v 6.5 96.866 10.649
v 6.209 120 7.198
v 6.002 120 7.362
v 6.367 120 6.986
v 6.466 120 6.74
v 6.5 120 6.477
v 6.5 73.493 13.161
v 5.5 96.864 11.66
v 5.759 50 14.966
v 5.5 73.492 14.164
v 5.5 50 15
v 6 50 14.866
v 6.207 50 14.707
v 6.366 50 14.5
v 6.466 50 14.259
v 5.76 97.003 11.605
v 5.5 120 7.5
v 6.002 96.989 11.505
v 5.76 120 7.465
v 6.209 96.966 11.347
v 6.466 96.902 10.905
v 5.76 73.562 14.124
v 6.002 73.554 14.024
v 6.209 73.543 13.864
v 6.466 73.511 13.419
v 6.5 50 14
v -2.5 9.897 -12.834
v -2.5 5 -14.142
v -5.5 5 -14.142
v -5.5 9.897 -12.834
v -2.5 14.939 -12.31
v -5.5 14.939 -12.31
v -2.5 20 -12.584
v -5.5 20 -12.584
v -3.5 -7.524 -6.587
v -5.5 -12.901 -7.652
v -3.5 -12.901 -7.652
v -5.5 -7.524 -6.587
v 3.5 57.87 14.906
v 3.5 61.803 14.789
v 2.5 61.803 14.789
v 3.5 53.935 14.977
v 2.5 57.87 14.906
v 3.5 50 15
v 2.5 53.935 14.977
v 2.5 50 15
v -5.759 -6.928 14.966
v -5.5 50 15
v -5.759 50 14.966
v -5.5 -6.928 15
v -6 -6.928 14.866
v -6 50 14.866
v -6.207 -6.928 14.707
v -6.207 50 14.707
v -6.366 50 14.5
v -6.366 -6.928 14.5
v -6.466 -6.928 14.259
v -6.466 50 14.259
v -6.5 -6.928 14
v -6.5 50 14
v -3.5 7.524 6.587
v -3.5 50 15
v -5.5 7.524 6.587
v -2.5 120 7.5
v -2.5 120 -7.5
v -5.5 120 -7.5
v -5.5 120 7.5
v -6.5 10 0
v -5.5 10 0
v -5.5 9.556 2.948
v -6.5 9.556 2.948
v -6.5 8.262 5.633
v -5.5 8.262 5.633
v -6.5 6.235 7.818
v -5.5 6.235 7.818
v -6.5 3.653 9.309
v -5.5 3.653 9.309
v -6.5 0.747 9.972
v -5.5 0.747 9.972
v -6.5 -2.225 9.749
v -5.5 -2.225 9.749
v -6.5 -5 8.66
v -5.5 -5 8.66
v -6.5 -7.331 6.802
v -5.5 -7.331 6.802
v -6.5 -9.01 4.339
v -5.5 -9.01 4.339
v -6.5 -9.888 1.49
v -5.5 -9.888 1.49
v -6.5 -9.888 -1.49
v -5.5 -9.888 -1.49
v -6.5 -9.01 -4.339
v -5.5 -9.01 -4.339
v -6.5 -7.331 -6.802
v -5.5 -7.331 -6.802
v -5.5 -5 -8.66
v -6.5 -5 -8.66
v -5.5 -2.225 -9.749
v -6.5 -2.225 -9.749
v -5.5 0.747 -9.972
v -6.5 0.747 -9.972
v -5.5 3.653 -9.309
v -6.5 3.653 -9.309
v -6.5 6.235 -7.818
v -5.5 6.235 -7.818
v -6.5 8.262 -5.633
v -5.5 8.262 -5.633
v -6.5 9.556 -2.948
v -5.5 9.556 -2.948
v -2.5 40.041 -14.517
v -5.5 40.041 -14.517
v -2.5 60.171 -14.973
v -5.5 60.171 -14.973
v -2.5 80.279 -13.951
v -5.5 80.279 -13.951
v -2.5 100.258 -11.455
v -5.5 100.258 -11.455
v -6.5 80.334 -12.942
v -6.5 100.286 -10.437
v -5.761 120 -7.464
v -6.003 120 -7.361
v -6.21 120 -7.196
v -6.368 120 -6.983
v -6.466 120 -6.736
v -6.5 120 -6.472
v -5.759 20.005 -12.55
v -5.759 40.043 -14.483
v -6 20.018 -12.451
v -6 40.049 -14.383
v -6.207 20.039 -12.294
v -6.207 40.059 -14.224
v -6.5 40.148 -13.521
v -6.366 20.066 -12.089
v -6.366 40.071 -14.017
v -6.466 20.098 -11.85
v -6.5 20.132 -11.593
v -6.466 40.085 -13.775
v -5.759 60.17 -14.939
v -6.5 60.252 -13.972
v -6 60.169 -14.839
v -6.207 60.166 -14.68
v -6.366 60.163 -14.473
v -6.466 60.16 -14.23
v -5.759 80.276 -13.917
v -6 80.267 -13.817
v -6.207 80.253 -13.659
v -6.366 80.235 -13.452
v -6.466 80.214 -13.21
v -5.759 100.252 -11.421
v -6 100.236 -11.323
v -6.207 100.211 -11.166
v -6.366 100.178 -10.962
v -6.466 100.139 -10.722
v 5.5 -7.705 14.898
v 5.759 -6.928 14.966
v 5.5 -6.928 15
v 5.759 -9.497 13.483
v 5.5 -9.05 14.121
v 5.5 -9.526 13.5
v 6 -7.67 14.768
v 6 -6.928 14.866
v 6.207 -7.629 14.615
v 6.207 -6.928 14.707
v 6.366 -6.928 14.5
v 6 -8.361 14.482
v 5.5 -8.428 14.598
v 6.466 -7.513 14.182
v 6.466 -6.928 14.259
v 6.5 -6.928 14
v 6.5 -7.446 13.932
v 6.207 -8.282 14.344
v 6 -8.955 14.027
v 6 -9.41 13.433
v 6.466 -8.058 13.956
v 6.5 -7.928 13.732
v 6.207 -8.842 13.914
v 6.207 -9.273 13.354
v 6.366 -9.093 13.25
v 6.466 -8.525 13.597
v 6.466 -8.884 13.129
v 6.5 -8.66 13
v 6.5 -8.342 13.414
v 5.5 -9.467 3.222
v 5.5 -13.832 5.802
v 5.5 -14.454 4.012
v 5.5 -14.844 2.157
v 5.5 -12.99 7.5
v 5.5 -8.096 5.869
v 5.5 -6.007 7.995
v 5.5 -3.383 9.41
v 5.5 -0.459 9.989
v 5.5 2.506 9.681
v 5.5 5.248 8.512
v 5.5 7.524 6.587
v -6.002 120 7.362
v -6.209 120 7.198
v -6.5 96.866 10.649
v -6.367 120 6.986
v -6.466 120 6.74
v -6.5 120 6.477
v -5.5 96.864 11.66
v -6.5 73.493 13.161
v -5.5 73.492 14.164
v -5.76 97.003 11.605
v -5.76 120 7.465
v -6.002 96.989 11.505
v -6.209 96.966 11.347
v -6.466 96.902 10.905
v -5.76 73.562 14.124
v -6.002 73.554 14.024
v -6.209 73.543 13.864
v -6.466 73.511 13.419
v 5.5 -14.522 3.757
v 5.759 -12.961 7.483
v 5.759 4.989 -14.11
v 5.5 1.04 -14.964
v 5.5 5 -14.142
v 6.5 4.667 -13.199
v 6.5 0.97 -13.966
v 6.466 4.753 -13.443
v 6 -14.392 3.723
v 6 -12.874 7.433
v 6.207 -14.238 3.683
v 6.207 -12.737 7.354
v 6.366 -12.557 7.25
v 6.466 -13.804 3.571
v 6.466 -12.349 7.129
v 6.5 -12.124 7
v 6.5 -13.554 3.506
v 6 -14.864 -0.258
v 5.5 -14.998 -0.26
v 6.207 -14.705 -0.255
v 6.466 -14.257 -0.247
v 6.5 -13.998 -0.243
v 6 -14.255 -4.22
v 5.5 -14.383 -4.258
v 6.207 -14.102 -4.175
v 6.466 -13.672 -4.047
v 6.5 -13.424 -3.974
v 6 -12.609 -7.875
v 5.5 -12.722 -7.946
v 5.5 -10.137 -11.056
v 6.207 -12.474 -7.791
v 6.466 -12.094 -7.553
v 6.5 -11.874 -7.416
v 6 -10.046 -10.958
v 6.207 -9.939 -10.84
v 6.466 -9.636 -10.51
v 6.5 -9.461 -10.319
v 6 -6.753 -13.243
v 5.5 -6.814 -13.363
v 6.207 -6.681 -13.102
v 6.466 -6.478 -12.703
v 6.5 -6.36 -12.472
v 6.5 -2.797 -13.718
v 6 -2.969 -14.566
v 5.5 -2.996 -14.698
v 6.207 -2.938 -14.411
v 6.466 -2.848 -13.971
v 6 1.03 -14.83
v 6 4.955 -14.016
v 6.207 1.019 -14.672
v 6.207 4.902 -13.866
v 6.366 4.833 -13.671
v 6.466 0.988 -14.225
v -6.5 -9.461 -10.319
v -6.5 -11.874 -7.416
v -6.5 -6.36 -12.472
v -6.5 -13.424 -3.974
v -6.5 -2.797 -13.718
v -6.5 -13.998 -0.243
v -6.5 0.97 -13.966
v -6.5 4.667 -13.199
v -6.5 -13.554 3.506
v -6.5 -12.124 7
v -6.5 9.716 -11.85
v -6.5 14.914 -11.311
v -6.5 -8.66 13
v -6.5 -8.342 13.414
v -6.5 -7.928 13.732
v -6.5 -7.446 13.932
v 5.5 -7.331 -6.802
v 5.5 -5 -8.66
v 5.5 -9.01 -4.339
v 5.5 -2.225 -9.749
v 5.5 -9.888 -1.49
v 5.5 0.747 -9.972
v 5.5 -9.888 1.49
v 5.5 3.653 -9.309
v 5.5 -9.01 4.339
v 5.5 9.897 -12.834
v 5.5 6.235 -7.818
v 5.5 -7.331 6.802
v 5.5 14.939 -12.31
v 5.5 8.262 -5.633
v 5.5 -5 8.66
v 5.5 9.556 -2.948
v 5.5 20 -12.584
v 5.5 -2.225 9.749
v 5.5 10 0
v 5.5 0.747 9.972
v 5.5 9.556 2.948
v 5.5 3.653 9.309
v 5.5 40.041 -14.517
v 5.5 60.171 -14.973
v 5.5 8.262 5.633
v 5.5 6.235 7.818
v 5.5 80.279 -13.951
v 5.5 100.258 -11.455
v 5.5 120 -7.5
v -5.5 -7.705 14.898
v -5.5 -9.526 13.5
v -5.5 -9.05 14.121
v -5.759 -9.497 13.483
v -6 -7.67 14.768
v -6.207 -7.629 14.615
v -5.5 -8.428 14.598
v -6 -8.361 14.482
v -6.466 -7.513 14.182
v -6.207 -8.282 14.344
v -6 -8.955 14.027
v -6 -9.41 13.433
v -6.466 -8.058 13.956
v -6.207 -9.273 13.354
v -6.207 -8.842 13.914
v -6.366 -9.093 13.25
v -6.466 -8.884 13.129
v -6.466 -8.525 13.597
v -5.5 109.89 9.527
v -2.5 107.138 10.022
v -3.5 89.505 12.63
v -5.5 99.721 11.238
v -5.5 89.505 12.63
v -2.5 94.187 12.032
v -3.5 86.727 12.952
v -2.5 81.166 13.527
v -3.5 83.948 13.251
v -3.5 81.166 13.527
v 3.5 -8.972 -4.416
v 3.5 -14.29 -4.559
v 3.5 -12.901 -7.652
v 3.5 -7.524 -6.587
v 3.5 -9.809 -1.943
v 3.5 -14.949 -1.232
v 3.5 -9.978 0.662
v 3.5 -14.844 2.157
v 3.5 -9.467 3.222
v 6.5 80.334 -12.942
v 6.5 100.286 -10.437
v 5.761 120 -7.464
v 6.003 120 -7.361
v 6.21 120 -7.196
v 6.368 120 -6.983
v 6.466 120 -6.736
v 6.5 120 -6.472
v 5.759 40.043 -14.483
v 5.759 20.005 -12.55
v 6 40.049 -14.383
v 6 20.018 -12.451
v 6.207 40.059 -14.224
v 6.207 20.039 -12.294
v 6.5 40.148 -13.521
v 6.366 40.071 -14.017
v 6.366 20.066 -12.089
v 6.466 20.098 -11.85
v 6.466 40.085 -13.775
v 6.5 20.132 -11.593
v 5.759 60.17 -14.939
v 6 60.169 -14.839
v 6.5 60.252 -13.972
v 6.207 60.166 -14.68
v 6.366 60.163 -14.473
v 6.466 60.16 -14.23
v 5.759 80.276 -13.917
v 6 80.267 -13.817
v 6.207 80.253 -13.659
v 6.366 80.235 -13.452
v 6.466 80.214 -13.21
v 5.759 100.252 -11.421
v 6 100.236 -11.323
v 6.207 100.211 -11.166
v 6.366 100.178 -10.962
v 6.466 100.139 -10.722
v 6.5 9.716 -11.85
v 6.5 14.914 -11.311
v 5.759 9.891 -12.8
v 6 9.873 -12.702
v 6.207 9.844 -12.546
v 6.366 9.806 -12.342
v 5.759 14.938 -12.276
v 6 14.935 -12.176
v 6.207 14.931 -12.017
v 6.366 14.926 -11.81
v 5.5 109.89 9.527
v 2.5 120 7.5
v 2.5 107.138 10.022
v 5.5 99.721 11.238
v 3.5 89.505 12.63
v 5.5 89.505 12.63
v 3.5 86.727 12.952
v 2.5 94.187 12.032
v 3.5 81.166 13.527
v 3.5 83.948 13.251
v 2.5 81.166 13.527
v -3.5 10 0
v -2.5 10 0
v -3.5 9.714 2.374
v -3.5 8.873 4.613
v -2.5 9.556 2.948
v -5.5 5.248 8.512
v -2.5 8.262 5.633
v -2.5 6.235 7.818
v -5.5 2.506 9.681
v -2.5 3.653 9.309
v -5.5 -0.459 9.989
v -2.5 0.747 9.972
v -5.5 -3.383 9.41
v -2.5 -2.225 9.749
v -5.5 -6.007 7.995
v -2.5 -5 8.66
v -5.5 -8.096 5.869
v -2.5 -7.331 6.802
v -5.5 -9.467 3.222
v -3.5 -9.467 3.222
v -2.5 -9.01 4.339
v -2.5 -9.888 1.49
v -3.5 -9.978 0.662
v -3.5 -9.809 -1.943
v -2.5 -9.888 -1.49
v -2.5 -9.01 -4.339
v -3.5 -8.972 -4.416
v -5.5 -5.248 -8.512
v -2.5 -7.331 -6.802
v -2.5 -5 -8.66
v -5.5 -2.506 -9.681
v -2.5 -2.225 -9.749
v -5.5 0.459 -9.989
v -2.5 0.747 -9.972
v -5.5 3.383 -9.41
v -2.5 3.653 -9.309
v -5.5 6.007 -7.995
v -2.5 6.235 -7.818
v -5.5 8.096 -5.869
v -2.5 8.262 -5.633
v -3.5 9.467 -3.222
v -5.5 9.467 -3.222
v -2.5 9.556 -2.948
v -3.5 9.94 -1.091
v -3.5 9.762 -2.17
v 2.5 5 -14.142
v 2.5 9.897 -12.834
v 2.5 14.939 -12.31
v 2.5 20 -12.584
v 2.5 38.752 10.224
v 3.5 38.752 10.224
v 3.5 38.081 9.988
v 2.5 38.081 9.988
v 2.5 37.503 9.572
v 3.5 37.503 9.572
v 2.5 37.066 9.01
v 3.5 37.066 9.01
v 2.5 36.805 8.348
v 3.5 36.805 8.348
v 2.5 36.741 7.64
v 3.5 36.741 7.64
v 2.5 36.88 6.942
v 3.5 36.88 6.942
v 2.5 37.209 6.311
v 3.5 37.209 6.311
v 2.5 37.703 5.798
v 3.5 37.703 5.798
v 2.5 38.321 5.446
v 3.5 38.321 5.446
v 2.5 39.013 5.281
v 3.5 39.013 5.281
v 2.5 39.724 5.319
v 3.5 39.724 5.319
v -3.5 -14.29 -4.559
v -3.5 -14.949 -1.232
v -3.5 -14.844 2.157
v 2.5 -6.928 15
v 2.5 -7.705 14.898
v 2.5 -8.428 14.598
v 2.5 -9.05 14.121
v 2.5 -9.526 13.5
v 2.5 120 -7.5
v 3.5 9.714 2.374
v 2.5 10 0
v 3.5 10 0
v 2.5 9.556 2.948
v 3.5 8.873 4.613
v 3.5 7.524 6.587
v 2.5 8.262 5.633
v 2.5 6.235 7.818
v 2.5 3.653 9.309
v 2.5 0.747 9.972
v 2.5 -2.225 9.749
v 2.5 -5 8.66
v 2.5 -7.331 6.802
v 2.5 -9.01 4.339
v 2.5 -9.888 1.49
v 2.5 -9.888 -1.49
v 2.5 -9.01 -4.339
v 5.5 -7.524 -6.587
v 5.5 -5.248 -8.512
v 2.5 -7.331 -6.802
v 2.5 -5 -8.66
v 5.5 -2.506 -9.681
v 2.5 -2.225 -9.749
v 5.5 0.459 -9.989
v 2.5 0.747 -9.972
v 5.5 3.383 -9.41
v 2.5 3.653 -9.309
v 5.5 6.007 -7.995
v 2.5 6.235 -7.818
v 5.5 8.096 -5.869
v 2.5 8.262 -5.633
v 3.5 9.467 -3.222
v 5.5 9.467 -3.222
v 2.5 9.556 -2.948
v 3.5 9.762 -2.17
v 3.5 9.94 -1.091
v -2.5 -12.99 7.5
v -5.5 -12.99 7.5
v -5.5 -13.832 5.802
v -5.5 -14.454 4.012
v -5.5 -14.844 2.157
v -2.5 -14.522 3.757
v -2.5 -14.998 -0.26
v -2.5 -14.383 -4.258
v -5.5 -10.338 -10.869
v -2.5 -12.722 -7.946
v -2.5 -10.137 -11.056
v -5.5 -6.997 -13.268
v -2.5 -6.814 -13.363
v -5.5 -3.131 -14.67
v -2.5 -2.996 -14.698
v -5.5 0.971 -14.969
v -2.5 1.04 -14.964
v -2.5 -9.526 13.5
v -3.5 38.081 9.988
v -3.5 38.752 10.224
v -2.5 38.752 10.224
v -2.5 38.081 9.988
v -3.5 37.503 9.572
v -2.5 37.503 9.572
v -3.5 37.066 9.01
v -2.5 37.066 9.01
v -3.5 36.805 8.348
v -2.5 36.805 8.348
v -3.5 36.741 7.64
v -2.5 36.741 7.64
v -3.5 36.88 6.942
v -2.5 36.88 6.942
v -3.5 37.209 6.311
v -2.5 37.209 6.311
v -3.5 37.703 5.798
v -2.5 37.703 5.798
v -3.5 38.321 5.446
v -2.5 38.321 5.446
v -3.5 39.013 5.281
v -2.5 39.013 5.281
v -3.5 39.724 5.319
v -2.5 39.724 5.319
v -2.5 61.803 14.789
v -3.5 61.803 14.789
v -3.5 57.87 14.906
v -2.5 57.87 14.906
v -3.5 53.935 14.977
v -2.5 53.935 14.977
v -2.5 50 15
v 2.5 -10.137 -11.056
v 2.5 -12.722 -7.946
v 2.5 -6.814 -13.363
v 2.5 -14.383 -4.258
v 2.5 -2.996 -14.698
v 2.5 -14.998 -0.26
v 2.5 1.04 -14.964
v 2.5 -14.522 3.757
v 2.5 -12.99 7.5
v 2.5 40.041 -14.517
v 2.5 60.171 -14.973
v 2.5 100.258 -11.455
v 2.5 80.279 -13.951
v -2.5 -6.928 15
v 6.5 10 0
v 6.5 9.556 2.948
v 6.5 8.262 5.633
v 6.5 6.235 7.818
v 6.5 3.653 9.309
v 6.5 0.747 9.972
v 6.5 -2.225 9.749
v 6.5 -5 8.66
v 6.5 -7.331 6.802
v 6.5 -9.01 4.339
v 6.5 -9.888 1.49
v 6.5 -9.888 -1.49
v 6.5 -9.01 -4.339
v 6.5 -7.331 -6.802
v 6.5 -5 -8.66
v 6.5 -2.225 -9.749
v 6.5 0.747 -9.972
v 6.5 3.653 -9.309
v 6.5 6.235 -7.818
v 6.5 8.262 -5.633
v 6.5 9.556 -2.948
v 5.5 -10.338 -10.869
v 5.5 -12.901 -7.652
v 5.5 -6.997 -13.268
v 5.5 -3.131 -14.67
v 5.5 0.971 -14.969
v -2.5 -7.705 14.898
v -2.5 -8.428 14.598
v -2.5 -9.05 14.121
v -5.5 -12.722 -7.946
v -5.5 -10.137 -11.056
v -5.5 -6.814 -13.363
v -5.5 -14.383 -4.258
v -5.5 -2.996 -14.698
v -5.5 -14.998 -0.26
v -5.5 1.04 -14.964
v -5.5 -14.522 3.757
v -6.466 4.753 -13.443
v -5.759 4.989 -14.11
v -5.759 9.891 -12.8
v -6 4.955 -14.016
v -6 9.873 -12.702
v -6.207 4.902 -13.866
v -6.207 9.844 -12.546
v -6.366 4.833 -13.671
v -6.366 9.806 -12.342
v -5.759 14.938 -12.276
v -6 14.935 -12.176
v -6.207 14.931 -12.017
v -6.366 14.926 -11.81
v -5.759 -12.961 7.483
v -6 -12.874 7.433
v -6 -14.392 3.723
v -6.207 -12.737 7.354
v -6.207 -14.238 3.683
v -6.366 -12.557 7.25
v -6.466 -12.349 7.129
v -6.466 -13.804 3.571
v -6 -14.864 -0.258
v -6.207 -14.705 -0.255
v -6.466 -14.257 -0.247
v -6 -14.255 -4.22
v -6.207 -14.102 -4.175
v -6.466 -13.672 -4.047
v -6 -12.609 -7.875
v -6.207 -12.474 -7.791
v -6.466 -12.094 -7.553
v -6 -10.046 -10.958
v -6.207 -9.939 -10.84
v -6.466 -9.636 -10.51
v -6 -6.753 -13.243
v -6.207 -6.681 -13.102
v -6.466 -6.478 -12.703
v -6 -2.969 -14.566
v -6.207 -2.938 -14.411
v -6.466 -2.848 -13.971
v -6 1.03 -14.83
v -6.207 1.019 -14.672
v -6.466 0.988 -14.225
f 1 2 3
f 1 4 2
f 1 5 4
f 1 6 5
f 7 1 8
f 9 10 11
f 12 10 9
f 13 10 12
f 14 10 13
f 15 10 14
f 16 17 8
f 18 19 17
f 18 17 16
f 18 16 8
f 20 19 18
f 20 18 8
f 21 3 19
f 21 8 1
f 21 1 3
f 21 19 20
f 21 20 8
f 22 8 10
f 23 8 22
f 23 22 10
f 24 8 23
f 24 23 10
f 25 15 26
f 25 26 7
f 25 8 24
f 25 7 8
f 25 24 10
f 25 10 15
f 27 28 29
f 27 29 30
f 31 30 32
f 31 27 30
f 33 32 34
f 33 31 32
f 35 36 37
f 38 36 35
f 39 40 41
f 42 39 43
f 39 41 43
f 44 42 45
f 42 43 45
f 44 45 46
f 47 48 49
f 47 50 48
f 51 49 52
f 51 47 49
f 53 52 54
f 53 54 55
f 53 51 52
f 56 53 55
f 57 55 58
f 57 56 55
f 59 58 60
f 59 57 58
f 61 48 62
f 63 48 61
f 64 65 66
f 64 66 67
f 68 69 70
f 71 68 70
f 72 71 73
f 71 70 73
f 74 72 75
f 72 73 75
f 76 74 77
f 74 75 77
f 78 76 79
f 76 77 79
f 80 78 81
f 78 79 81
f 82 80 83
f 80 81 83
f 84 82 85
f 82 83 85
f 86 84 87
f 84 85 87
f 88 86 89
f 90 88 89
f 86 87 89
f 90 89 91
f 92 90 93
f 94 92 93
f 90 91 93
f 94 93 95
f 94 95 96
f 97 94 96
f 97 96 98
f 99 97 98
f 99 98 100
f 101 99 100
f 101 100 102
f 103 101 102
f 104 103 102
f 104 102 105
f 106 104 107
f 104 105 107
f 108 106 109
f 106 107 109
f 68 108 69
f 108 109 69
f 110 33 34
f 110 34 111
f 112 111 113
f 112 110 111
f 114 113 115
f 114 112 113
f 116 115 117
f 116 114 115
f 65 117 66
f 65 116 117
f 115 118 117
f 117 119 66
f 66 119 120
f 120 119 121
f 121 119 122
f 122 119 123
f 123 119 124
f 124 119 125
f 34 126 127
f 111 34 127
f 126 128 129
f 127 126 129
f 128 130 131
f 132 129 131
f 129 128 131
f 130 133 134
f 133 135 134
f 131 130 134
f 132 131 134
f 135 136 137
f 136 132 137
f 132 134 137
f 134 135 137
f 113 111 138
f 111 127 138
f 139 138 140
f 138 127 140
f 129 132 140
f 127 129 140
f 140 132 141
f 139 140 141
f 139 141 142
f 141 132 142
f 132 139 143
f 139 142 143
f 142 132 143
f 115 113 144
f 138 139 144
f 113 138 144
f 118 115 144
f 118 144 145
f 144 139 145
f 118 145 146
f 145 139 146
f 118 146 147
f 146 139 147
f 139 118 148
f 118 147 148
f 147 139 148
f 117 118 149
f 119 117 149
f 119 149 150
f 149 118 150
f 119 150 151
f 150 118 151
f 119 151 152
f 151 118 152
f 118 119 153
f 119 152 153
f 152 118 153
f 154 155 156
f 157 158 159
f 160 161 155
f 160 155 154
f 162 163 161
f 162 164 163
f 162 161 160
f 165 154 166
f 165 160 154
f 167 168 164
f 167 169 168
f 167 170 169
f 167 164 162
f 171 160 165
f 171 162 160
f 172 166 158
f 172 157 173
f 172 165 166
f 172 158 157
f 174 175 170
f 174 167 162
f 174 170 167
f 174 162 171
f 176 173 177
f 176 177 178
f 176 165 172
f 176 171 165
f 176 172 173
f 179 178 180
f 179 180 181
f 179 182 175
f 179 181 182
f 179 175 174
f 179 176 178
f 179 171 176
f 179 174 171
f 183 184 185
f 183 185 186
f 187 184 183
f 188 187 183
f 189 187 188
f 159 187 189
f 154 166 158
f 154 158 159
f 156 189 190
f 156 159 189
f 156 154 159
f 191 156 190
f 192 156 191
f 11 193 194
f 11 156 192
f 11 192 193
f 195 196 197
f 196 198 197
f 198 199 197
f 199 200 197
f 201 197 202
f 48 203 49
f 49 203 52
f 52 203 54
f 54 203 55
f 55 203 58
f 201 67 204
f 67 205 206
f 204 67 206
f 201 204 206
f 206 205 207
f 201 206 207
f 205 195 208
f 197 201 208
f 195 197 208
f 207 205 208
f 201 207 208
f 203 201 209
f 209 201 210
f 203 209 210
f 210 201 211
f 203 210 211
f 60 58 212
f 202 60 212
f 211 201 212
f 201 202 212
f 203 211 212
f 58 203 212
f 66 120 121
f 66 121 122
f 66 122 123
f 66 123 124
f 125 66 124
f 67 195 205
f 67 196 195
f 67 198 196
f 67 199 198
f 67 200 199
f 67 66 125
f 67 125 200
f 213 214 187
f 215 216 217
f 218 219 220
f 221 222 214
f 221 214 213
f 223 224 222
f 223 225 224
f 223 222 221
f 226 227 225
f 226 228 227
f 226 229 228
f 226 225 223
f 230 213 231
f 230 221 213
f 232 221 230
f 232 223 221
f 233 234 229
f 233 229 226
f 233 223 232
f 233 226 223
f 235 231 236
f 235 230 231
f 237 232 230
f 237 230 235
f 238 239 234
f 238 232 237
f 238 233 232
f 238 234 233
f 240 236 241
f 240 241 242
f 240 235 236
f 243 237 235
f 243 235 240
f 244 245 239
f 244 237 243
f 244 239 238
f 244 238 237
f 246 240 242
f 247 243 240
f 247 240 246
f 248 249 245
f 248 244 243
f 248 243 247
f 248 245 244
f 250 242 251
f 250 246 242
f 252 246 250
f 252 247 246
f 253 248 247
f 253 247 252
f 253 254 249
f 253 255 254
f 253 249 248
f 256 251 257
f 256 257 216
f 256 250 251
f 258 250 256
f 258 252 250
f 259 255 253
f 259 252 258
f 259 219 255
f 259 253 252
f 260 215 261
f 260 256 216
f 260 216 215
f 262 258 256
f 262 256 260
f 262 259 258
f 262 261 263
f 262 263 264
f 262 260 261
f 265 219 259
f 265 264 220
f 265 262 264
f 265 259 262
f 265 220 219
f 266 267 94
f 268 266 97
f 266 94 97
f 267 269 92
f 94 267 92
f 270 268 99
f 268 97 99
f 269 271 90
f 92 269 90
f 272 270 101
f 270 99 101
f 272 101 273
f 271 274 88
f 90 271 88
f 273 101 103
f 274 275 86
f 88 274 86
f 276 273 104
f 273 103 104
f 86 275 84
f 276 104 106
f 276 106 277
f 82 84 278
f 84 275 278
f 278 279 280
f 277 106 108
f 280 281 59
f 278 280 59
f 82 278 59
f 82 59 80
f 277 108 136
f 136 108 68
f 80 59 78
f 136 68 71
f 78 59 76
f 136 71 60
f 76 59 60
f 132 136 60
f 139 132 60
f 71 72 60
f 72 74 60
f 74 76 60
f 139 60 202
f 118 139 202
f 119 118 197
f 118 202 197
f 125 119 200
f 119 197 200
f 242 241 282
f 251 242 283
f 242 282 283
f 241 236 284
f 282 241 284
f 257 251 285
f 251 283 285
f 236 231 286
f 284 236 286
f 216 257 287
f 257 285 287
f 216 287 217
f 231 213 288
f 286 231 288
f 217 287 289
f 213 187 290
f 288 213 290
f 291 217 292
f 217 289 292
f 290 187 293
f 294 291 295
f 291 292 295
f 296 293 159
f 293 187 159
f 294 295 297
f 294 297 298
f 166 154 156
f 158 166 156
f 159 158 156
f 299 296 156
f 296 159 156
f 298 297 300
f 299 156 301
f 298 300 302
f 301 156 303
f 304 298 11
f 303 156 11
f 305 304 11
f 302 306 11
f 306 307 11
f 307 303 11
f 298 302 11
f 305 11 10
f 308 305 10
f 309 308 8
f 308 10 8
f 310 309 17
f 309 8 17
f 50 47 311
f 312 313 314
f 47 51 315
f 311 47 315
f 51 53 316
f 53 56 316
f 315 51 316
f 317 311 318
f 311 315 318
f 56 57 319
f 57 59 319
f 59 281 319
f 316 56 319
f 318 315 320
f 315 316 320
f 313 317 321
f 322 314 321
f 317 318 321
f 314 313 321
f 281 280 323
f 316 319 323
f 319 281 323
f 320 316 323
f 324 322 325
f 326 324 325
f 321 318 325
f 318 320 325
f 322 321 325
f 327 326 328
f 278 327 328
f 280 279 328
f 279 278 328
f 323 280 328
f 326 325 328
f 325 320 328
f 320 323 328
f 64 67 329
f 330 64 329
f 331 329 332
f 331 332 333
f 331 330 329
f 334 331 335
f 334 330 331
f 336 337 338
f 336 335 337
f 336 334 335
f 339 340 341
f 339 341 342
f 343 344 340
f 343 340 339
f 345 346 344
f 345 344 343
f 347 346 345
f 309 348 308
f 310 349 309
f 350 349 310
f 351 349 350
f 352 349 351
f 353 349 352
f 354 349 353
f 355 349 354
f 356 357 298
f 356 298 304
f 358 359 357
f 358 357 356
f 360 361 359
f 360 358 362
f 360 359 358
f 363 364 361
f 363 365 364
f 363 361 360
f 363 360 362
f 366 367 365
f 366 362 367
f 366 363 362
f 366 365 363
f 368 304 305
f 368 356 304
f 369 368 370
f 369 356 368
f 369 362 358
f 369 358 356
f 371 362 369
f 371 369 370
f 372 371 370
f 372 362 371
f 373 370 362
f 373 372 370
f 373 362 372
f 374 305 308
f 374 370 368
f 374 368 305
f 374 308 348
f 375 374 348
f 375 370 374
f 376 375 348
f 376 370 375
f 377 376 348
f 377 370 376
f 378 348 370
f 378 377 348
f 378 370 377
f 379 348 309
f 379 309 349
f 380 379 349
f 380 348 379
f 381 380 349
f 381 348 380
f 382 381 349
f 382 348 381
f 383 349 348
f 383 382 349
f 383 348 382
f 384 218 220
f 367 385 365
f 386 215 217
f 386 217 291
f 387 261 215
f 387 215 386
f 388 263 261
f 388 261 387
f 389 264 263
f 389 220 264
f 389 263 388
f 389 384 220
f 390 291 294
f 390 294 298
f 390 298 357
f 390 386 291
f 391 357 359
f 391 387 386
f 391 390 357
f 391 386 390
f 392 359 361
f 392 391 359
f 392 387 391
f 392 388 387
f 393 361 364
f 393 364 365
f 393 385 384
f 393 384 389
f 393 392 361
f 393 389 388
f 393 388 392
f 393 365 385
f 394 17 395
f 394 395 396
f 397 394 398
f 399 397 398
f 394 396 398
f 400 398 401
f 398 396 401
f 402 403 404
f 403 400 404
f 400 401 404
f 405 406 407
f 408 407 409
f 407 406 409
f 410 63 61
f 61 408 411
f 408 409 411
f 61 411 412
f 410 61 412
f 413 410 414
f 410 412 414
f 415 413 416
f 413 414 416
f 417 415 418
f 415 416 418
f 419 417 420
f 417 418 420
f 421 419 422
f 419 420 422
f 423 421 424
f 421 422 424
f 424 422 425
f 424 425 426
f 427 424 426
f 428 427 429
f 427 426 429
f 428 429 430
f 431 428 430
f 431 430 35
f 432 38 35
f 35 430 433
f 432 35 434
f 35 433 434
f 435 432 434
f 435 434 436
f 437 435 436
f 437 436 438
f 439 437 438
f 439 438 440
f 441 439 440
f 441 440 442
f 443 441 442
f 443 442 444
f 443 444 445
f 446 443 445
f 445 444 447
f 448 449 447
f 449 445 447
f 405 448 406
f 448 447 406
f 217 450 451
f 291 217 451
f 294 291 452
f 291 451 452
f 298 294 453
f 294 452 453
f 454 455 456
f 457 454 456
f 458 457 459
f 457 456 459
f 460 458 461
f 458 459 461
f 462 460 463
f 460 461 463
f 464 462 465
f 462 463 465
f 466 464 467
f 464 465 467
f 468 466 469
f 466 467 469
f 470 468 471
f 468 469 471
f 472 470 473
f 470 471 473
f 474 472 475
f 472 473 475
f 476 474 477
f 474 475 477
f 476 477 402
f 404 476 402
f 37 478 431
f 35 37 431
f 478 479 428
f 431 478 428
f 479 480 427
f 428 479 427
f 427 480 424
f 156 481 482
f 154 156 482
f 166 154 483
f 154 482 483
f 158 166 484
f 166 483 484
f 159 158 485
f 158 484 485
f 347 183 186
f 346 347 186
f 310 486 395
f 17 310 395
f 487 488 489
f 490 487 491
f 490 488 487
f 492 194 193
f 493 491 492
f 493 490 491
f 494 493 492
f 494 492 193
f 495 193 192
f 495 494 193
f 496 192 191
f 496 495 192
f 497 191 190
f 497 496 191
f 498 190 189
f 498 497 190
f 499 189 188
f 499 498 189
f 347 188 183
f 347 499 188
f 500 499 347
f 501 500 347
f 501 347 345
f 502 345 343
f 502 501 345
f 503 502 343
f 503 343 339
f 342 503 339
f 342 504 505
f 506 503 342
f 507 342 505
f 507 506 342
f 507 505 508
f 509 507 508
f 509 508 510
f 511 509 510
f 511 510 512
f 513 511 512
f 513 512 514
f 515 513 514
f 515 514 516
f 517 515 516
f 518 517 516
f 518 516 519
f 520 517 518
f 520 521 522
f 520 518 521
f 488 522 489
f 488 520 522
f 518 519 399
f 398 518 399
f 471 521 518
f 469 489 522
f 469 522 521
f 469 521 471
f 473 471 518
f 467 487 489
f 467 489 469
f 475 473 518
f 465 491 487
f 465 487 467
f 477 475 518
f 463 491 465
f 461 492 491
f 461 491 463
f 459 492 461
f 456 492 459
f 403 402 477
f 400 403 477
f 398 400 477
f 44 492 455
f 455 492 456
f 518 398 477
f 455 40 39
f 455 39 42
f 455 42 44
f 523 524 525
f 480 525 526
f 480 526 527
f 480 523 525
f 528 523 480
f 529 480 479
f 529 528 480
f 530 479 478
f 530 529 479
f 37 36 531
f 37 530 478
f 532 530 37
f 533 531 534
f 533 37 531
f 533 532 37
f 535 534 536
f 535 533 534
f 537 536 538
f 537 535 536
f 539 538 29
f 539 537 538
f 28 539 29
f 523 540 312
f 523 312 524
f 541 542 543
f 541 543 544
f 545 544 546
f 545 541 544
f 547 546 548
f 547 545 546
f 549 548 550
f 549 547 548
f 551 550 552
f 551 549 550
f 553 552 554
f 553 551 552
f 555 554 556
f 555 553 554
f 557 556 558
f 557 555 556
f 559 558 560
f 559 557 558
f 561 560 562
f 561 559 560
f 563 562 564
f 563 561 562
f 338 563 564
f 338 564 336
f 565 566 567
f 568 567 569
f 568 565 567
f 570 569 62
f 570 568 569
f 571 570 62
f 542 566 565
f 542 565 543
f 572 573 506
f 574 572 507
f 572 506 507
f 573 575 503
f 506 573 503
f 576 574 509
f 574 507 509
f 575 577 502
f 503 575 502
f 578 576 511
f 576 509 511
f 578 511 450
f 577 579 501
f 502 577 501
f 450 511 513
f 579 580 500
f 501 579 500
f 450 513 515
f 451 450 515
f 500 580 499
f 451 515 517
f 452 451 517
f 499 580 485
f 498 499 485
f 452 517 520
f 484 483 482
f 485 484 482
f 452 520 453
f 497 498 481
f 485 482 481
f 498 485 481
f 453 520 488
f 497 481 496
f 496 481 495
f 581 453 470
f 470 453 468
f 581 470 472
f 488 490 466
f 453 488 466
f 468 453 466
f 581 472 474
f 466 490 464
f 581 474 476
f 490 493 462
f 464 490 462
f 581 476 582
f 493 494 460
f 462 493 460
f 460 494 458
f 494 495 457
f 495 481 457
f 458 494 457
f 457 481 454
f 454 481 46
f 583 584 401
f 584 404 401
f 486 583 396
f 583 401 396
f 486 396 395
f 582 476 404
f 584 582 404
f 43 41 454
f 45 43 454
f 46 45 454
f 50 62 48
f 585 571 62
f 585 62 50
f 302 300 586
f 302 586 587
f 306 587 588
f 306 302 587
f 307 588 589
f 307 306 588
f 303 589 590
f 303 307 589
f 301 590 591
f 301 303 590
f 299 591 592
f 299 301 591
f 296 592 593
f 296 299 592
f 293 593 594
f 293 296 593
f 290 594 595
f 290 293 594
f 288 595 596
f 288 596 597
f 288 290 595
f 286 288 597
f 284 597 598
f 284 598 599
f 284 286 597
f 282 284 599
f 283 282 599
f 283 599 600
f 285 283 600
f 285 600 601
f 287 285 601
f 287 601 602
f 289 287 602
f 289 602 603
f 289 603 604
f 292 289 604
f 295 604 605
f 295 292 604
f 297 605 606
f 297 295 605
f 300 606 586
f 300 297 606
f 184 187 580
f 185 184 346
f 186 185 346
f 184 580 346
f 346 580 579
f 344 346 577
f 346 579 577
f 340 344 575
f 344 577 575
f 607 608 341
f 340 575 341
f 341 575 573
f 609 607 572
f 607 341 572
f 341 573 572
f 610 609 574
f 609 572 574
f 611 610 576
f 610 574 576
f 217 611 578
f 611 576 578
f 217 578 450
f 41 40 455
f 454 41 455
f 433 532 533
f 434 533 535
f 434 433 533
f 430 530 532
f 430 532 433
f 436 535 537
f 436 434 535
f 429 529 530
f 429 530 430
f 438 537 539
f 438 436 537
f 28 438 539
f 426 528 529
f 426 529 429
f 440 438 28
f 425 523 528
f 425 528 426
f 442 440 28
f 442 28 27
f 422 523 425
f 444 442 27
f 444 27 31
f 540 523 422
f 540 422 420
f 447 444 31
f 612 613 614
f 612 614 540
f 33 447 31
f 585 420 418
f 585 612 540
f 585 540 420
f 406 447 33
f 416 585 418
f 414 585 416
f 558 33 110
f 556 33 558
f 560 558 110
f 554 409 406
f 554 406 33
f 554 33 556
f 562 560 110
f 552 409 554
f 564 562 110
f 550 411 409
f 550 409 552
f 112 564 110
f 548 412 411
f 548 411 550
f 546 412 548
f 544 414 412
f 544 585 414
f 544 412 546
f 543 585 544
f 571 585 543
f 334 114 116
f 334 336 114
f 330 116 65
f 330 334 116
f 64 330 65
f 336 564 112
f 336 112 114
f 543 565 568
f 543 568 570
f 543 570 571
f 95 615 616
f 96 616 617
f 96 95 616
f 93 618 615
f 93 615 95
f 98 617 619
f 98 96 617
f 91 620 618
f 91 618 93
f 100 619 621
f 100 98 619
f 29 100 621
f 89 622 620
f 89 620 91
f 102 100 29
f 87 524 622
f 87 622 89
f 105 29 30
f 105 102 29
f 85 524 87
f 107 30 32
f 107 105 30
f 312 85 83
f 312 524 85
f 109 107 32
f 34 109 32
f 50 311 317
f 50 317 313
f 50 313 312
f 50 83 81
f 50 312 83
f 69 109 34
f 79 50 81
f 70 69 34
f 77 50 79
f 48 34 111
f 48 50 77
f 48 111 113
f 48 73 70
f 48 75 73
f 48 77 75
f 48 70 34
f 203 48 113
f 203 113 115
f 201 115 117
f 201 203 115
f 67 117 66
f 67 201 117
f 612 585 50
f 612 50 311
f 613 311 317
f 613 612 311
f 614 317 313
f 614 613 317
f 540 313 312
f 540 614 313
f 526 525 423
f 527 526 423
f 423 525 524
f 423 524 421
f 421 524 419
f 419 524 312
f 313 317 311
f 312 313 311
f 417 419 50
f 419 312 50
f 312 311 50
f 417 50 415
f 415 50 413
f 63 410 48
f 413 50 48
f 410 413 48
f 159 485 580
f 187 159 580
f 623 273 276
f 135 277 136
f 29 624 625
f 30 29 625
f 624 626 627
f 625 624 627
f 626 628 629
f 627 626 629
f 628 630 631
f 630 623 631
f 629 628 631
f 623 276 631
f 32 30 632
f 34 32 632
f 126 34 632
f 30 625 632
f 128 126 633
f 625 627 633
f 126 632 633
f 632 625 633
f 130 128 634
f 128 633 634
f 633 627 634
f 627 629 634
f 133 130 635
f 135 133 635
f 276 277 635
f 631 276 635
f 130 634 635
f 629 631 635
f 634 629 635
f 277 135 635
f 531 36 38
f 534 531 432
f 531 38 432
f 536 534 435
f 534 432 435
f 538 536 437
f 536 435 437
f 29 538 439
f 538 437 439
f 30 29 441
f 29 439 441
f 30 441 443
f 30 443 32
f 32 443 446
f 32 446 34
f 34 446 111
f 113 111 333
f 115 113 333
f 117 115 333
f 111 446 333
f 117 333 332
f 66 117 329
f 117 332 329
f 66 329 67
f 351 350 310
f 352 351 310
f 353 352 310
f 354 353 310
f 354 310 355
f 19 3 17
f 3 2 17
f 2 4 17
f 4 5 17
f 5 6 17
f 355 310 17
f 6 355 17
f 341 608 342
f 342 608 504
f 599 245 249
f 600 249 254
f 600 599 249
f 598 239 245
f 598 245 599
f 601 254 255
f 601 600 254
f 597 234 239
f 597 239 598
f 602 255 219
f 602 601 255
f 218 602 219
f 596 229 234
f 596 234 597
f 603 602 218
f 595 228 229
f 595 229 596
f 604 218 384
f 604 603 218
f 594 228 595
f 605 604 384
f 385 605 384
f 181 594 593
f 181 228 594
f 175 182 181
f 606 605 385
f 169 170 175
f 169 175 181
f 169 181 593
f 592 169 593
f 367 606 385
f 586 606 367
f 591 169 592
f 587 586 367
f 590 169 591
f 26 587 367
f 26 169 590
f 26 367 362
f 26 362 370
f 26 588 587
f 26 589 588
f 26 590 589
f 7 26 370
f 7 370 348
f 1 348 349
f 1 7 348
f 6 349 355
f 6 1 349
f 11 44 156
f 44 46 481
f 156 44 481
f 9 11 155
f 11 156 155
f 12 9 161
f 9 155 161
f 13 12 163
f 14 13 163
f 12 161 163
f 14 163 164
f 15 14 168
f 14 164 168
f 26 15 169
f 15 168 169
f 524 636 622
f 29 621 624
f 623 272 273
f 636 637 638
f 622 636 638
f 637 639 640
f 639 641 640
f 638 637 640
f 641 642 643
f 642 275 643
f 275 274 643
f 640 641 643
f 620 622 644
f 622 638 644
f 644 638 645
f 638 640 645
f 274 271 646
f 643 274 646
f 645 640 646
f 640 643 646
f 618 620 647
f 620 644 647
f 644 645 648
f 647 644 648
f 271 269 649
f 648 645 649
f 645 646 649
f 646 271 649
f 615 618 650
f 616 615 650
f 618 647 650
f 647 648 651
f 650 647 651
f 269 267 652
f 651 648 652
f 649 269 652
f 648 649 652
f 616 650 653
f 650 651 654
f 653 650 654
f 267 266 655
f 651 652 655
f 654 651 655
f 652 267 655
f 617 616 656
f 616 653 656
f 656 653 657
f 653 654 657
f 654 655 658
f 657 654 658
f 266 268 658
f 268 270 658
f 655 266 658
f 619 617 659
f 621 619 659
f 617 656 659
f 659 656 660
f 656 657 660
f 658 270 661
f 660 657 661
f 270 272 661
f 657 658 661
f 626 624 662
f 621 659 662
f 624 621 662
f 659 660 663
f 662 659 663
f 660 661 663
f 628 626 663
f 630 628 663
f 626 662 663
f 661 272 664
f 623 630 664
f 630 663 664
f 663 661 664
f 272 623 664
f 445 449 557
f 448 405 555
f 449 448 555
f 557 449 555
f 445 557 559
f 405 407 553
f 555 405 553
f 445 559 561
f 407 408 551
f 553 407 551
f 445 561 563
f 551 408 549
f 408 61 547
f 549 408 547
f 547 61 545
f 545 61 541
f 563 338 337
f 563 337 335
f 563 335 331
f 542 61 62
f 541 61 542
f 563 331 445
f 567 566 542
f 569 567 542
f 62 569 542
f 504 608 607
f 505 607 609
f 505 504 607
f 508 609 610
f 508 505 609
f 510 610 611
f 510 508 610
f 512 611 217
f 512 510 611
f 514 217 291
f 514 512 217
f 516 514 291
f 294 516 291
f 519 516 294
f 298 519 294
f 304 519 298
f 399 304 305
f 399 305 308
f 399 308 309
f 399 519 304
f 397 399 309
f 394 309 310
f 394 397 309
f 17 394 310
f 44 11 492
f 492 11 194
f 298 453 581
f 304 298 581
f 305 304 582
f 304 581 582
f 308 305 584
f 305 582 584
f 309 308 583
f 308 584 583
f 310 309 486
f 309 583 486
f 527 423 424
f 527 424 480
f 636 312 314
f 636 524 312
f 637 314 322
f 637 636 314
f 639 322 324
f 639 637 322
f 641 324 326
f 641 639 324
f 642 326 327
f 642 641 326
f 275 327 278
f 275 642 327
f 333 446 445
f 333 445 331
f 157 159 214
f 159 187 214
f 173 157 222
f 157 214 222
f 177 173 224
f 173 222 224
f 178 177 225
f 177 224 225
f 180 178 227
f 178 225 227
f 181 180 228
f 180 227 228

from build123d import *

# Parameters (mm, degrees)
F1_R     = 10
F2_DEPTH = 3
F4_DEPTH = 2
F6_DEPTH = 1.001
F7_START = 3
F7_DEPTH = 1
F8_R     = 0.99999


# Not quite as in the source:
# - a fillet or chamfer is up to 0.001 mm smaller than in the source, because OpenCascade refuses the exact size


with BuildPart() as f2:
    # F1 (on offset) → F2 (new body)
    with BuildSketch(Plane.YZ.offset(2.5)):
        with BuildLine():
            Line((-9.5262794416, 13.5), (-12.9903810568, 7.5))
            ThreePointArc((-12.9903810568, 7.5), (-11.5350360185, -9.5886883385), (5, -14.1421356237))
            ThreePointArc((5, -14.1421356237), (12.4075163283, -12.4727233008), (20, -12.5842013328))
            ThreePointArc((20, -12.5842013328), (70.2340902125, -14.6463678304), (120, -7.5))
            Line((120, -7.5), (120, 7.5))
            ThreePointArc((120, 7.5), (85.2003196008, 13.1196496077), (50, 15))
            Line((50, 15), (-6.9282032303, 15))
            ThreePointArc((-6.9282032303, 15), (-8.4282032303, 14.5980762114), (-9.5262794416, 13.5))
        make_face()
        Circle(F1_R, mode=Mode.SUBTRACT)
    extrude(amount=F2_DEPTH)

    # F3 (on face) → F4 (cut)
    with BuildSketch(Plane.YZ.offset(5.5)):
        Polygon((50, 15), (-25.7355715851, 0), (-25.7355715851, -10.1942473186), (101.4711431703, 15), align=None)
    extrude(amount=-F4_DEPTH, mode=Mode.SUBTRACT)

    # F5 (on face) → F6 (cut, through all)
    with BuildSketch(Plane.YZ.offset(3.5)):
        with BuildLine():
            Line((61.8030459338, 14.7891202569), (38.7521068975, 10.2237082806))
            ThreePointArc((38.7521068975, 10.2237082806), (36.7854524498, 7.2856357349), (39.7235249955, 5.3189812873))
            Line((39.7235249955, 5.3189812873), (87.538617519, 14.7891202569))
            Line((87.538617519, 14.7891202569), (61.8030459338, 14.7891202569))
        make_face()
    extrude(amount=-F6_DEPTH, mode=Mode.SUBTRACT)


with BuildPart() as f7:
    # F1 (on offset) → F7 (new body)
    with BuildSketch(Plane.YZ.offset(2.5).offset(F7_START)):
        with BuildLine():
            Line((-9.5262794416, 13.5), (-12.9903810568, 7.5))
            ThreePointArc((-12.9903810568, 7.5), (-11.5350360185, -9.5886883385), (5, -14.1421356237))
            ThreePointArc((5, -14.1421356237), (12.4075163283, -12.4727233008), (20, -12.5842013328))
            ThreePointArc((20, -12.5842013328), (70.2340902125, -14.6463678304), (120, -7.5))
            Line((120, -7.5), (120, 7.5))
            ThreePointArc((120, 7.5), (85.2003196008, 13.1196496077), (50, 15))
            Line((50, 15), (-6.9282032303, 15))
            ThreePointArc((-6.9282032303, 15), (-8.4282032303, 14.5980762114), (-9.5262794416, 13.5))
        make_face()
        Circle(F1_R, mode=Mode.SUBTRACT)
    extrude(amount=F7_DEPTH)

    # F8 (radius 1 in the source; OpenCascade refuses exactly that, so slightly less here)
    f8_edges = [f7.edges().sort_by_distance(p)[0] for p in [
        (6.5, -11.25833, 10.5),
    ]]
    fillet(f8_edges, radius=F8_R)


with BuildPart() as f9_1:
    # F9: instance of F2
    add(f2.part.mirror(Plane.YZ))


with BuildPart() as f9_2:
    # F9: instance of F7
    add(f7.part.mirror(Plane.YZ))


solid = Compound([f2.part, f7.part, f9_1.part, f9_2.part])
